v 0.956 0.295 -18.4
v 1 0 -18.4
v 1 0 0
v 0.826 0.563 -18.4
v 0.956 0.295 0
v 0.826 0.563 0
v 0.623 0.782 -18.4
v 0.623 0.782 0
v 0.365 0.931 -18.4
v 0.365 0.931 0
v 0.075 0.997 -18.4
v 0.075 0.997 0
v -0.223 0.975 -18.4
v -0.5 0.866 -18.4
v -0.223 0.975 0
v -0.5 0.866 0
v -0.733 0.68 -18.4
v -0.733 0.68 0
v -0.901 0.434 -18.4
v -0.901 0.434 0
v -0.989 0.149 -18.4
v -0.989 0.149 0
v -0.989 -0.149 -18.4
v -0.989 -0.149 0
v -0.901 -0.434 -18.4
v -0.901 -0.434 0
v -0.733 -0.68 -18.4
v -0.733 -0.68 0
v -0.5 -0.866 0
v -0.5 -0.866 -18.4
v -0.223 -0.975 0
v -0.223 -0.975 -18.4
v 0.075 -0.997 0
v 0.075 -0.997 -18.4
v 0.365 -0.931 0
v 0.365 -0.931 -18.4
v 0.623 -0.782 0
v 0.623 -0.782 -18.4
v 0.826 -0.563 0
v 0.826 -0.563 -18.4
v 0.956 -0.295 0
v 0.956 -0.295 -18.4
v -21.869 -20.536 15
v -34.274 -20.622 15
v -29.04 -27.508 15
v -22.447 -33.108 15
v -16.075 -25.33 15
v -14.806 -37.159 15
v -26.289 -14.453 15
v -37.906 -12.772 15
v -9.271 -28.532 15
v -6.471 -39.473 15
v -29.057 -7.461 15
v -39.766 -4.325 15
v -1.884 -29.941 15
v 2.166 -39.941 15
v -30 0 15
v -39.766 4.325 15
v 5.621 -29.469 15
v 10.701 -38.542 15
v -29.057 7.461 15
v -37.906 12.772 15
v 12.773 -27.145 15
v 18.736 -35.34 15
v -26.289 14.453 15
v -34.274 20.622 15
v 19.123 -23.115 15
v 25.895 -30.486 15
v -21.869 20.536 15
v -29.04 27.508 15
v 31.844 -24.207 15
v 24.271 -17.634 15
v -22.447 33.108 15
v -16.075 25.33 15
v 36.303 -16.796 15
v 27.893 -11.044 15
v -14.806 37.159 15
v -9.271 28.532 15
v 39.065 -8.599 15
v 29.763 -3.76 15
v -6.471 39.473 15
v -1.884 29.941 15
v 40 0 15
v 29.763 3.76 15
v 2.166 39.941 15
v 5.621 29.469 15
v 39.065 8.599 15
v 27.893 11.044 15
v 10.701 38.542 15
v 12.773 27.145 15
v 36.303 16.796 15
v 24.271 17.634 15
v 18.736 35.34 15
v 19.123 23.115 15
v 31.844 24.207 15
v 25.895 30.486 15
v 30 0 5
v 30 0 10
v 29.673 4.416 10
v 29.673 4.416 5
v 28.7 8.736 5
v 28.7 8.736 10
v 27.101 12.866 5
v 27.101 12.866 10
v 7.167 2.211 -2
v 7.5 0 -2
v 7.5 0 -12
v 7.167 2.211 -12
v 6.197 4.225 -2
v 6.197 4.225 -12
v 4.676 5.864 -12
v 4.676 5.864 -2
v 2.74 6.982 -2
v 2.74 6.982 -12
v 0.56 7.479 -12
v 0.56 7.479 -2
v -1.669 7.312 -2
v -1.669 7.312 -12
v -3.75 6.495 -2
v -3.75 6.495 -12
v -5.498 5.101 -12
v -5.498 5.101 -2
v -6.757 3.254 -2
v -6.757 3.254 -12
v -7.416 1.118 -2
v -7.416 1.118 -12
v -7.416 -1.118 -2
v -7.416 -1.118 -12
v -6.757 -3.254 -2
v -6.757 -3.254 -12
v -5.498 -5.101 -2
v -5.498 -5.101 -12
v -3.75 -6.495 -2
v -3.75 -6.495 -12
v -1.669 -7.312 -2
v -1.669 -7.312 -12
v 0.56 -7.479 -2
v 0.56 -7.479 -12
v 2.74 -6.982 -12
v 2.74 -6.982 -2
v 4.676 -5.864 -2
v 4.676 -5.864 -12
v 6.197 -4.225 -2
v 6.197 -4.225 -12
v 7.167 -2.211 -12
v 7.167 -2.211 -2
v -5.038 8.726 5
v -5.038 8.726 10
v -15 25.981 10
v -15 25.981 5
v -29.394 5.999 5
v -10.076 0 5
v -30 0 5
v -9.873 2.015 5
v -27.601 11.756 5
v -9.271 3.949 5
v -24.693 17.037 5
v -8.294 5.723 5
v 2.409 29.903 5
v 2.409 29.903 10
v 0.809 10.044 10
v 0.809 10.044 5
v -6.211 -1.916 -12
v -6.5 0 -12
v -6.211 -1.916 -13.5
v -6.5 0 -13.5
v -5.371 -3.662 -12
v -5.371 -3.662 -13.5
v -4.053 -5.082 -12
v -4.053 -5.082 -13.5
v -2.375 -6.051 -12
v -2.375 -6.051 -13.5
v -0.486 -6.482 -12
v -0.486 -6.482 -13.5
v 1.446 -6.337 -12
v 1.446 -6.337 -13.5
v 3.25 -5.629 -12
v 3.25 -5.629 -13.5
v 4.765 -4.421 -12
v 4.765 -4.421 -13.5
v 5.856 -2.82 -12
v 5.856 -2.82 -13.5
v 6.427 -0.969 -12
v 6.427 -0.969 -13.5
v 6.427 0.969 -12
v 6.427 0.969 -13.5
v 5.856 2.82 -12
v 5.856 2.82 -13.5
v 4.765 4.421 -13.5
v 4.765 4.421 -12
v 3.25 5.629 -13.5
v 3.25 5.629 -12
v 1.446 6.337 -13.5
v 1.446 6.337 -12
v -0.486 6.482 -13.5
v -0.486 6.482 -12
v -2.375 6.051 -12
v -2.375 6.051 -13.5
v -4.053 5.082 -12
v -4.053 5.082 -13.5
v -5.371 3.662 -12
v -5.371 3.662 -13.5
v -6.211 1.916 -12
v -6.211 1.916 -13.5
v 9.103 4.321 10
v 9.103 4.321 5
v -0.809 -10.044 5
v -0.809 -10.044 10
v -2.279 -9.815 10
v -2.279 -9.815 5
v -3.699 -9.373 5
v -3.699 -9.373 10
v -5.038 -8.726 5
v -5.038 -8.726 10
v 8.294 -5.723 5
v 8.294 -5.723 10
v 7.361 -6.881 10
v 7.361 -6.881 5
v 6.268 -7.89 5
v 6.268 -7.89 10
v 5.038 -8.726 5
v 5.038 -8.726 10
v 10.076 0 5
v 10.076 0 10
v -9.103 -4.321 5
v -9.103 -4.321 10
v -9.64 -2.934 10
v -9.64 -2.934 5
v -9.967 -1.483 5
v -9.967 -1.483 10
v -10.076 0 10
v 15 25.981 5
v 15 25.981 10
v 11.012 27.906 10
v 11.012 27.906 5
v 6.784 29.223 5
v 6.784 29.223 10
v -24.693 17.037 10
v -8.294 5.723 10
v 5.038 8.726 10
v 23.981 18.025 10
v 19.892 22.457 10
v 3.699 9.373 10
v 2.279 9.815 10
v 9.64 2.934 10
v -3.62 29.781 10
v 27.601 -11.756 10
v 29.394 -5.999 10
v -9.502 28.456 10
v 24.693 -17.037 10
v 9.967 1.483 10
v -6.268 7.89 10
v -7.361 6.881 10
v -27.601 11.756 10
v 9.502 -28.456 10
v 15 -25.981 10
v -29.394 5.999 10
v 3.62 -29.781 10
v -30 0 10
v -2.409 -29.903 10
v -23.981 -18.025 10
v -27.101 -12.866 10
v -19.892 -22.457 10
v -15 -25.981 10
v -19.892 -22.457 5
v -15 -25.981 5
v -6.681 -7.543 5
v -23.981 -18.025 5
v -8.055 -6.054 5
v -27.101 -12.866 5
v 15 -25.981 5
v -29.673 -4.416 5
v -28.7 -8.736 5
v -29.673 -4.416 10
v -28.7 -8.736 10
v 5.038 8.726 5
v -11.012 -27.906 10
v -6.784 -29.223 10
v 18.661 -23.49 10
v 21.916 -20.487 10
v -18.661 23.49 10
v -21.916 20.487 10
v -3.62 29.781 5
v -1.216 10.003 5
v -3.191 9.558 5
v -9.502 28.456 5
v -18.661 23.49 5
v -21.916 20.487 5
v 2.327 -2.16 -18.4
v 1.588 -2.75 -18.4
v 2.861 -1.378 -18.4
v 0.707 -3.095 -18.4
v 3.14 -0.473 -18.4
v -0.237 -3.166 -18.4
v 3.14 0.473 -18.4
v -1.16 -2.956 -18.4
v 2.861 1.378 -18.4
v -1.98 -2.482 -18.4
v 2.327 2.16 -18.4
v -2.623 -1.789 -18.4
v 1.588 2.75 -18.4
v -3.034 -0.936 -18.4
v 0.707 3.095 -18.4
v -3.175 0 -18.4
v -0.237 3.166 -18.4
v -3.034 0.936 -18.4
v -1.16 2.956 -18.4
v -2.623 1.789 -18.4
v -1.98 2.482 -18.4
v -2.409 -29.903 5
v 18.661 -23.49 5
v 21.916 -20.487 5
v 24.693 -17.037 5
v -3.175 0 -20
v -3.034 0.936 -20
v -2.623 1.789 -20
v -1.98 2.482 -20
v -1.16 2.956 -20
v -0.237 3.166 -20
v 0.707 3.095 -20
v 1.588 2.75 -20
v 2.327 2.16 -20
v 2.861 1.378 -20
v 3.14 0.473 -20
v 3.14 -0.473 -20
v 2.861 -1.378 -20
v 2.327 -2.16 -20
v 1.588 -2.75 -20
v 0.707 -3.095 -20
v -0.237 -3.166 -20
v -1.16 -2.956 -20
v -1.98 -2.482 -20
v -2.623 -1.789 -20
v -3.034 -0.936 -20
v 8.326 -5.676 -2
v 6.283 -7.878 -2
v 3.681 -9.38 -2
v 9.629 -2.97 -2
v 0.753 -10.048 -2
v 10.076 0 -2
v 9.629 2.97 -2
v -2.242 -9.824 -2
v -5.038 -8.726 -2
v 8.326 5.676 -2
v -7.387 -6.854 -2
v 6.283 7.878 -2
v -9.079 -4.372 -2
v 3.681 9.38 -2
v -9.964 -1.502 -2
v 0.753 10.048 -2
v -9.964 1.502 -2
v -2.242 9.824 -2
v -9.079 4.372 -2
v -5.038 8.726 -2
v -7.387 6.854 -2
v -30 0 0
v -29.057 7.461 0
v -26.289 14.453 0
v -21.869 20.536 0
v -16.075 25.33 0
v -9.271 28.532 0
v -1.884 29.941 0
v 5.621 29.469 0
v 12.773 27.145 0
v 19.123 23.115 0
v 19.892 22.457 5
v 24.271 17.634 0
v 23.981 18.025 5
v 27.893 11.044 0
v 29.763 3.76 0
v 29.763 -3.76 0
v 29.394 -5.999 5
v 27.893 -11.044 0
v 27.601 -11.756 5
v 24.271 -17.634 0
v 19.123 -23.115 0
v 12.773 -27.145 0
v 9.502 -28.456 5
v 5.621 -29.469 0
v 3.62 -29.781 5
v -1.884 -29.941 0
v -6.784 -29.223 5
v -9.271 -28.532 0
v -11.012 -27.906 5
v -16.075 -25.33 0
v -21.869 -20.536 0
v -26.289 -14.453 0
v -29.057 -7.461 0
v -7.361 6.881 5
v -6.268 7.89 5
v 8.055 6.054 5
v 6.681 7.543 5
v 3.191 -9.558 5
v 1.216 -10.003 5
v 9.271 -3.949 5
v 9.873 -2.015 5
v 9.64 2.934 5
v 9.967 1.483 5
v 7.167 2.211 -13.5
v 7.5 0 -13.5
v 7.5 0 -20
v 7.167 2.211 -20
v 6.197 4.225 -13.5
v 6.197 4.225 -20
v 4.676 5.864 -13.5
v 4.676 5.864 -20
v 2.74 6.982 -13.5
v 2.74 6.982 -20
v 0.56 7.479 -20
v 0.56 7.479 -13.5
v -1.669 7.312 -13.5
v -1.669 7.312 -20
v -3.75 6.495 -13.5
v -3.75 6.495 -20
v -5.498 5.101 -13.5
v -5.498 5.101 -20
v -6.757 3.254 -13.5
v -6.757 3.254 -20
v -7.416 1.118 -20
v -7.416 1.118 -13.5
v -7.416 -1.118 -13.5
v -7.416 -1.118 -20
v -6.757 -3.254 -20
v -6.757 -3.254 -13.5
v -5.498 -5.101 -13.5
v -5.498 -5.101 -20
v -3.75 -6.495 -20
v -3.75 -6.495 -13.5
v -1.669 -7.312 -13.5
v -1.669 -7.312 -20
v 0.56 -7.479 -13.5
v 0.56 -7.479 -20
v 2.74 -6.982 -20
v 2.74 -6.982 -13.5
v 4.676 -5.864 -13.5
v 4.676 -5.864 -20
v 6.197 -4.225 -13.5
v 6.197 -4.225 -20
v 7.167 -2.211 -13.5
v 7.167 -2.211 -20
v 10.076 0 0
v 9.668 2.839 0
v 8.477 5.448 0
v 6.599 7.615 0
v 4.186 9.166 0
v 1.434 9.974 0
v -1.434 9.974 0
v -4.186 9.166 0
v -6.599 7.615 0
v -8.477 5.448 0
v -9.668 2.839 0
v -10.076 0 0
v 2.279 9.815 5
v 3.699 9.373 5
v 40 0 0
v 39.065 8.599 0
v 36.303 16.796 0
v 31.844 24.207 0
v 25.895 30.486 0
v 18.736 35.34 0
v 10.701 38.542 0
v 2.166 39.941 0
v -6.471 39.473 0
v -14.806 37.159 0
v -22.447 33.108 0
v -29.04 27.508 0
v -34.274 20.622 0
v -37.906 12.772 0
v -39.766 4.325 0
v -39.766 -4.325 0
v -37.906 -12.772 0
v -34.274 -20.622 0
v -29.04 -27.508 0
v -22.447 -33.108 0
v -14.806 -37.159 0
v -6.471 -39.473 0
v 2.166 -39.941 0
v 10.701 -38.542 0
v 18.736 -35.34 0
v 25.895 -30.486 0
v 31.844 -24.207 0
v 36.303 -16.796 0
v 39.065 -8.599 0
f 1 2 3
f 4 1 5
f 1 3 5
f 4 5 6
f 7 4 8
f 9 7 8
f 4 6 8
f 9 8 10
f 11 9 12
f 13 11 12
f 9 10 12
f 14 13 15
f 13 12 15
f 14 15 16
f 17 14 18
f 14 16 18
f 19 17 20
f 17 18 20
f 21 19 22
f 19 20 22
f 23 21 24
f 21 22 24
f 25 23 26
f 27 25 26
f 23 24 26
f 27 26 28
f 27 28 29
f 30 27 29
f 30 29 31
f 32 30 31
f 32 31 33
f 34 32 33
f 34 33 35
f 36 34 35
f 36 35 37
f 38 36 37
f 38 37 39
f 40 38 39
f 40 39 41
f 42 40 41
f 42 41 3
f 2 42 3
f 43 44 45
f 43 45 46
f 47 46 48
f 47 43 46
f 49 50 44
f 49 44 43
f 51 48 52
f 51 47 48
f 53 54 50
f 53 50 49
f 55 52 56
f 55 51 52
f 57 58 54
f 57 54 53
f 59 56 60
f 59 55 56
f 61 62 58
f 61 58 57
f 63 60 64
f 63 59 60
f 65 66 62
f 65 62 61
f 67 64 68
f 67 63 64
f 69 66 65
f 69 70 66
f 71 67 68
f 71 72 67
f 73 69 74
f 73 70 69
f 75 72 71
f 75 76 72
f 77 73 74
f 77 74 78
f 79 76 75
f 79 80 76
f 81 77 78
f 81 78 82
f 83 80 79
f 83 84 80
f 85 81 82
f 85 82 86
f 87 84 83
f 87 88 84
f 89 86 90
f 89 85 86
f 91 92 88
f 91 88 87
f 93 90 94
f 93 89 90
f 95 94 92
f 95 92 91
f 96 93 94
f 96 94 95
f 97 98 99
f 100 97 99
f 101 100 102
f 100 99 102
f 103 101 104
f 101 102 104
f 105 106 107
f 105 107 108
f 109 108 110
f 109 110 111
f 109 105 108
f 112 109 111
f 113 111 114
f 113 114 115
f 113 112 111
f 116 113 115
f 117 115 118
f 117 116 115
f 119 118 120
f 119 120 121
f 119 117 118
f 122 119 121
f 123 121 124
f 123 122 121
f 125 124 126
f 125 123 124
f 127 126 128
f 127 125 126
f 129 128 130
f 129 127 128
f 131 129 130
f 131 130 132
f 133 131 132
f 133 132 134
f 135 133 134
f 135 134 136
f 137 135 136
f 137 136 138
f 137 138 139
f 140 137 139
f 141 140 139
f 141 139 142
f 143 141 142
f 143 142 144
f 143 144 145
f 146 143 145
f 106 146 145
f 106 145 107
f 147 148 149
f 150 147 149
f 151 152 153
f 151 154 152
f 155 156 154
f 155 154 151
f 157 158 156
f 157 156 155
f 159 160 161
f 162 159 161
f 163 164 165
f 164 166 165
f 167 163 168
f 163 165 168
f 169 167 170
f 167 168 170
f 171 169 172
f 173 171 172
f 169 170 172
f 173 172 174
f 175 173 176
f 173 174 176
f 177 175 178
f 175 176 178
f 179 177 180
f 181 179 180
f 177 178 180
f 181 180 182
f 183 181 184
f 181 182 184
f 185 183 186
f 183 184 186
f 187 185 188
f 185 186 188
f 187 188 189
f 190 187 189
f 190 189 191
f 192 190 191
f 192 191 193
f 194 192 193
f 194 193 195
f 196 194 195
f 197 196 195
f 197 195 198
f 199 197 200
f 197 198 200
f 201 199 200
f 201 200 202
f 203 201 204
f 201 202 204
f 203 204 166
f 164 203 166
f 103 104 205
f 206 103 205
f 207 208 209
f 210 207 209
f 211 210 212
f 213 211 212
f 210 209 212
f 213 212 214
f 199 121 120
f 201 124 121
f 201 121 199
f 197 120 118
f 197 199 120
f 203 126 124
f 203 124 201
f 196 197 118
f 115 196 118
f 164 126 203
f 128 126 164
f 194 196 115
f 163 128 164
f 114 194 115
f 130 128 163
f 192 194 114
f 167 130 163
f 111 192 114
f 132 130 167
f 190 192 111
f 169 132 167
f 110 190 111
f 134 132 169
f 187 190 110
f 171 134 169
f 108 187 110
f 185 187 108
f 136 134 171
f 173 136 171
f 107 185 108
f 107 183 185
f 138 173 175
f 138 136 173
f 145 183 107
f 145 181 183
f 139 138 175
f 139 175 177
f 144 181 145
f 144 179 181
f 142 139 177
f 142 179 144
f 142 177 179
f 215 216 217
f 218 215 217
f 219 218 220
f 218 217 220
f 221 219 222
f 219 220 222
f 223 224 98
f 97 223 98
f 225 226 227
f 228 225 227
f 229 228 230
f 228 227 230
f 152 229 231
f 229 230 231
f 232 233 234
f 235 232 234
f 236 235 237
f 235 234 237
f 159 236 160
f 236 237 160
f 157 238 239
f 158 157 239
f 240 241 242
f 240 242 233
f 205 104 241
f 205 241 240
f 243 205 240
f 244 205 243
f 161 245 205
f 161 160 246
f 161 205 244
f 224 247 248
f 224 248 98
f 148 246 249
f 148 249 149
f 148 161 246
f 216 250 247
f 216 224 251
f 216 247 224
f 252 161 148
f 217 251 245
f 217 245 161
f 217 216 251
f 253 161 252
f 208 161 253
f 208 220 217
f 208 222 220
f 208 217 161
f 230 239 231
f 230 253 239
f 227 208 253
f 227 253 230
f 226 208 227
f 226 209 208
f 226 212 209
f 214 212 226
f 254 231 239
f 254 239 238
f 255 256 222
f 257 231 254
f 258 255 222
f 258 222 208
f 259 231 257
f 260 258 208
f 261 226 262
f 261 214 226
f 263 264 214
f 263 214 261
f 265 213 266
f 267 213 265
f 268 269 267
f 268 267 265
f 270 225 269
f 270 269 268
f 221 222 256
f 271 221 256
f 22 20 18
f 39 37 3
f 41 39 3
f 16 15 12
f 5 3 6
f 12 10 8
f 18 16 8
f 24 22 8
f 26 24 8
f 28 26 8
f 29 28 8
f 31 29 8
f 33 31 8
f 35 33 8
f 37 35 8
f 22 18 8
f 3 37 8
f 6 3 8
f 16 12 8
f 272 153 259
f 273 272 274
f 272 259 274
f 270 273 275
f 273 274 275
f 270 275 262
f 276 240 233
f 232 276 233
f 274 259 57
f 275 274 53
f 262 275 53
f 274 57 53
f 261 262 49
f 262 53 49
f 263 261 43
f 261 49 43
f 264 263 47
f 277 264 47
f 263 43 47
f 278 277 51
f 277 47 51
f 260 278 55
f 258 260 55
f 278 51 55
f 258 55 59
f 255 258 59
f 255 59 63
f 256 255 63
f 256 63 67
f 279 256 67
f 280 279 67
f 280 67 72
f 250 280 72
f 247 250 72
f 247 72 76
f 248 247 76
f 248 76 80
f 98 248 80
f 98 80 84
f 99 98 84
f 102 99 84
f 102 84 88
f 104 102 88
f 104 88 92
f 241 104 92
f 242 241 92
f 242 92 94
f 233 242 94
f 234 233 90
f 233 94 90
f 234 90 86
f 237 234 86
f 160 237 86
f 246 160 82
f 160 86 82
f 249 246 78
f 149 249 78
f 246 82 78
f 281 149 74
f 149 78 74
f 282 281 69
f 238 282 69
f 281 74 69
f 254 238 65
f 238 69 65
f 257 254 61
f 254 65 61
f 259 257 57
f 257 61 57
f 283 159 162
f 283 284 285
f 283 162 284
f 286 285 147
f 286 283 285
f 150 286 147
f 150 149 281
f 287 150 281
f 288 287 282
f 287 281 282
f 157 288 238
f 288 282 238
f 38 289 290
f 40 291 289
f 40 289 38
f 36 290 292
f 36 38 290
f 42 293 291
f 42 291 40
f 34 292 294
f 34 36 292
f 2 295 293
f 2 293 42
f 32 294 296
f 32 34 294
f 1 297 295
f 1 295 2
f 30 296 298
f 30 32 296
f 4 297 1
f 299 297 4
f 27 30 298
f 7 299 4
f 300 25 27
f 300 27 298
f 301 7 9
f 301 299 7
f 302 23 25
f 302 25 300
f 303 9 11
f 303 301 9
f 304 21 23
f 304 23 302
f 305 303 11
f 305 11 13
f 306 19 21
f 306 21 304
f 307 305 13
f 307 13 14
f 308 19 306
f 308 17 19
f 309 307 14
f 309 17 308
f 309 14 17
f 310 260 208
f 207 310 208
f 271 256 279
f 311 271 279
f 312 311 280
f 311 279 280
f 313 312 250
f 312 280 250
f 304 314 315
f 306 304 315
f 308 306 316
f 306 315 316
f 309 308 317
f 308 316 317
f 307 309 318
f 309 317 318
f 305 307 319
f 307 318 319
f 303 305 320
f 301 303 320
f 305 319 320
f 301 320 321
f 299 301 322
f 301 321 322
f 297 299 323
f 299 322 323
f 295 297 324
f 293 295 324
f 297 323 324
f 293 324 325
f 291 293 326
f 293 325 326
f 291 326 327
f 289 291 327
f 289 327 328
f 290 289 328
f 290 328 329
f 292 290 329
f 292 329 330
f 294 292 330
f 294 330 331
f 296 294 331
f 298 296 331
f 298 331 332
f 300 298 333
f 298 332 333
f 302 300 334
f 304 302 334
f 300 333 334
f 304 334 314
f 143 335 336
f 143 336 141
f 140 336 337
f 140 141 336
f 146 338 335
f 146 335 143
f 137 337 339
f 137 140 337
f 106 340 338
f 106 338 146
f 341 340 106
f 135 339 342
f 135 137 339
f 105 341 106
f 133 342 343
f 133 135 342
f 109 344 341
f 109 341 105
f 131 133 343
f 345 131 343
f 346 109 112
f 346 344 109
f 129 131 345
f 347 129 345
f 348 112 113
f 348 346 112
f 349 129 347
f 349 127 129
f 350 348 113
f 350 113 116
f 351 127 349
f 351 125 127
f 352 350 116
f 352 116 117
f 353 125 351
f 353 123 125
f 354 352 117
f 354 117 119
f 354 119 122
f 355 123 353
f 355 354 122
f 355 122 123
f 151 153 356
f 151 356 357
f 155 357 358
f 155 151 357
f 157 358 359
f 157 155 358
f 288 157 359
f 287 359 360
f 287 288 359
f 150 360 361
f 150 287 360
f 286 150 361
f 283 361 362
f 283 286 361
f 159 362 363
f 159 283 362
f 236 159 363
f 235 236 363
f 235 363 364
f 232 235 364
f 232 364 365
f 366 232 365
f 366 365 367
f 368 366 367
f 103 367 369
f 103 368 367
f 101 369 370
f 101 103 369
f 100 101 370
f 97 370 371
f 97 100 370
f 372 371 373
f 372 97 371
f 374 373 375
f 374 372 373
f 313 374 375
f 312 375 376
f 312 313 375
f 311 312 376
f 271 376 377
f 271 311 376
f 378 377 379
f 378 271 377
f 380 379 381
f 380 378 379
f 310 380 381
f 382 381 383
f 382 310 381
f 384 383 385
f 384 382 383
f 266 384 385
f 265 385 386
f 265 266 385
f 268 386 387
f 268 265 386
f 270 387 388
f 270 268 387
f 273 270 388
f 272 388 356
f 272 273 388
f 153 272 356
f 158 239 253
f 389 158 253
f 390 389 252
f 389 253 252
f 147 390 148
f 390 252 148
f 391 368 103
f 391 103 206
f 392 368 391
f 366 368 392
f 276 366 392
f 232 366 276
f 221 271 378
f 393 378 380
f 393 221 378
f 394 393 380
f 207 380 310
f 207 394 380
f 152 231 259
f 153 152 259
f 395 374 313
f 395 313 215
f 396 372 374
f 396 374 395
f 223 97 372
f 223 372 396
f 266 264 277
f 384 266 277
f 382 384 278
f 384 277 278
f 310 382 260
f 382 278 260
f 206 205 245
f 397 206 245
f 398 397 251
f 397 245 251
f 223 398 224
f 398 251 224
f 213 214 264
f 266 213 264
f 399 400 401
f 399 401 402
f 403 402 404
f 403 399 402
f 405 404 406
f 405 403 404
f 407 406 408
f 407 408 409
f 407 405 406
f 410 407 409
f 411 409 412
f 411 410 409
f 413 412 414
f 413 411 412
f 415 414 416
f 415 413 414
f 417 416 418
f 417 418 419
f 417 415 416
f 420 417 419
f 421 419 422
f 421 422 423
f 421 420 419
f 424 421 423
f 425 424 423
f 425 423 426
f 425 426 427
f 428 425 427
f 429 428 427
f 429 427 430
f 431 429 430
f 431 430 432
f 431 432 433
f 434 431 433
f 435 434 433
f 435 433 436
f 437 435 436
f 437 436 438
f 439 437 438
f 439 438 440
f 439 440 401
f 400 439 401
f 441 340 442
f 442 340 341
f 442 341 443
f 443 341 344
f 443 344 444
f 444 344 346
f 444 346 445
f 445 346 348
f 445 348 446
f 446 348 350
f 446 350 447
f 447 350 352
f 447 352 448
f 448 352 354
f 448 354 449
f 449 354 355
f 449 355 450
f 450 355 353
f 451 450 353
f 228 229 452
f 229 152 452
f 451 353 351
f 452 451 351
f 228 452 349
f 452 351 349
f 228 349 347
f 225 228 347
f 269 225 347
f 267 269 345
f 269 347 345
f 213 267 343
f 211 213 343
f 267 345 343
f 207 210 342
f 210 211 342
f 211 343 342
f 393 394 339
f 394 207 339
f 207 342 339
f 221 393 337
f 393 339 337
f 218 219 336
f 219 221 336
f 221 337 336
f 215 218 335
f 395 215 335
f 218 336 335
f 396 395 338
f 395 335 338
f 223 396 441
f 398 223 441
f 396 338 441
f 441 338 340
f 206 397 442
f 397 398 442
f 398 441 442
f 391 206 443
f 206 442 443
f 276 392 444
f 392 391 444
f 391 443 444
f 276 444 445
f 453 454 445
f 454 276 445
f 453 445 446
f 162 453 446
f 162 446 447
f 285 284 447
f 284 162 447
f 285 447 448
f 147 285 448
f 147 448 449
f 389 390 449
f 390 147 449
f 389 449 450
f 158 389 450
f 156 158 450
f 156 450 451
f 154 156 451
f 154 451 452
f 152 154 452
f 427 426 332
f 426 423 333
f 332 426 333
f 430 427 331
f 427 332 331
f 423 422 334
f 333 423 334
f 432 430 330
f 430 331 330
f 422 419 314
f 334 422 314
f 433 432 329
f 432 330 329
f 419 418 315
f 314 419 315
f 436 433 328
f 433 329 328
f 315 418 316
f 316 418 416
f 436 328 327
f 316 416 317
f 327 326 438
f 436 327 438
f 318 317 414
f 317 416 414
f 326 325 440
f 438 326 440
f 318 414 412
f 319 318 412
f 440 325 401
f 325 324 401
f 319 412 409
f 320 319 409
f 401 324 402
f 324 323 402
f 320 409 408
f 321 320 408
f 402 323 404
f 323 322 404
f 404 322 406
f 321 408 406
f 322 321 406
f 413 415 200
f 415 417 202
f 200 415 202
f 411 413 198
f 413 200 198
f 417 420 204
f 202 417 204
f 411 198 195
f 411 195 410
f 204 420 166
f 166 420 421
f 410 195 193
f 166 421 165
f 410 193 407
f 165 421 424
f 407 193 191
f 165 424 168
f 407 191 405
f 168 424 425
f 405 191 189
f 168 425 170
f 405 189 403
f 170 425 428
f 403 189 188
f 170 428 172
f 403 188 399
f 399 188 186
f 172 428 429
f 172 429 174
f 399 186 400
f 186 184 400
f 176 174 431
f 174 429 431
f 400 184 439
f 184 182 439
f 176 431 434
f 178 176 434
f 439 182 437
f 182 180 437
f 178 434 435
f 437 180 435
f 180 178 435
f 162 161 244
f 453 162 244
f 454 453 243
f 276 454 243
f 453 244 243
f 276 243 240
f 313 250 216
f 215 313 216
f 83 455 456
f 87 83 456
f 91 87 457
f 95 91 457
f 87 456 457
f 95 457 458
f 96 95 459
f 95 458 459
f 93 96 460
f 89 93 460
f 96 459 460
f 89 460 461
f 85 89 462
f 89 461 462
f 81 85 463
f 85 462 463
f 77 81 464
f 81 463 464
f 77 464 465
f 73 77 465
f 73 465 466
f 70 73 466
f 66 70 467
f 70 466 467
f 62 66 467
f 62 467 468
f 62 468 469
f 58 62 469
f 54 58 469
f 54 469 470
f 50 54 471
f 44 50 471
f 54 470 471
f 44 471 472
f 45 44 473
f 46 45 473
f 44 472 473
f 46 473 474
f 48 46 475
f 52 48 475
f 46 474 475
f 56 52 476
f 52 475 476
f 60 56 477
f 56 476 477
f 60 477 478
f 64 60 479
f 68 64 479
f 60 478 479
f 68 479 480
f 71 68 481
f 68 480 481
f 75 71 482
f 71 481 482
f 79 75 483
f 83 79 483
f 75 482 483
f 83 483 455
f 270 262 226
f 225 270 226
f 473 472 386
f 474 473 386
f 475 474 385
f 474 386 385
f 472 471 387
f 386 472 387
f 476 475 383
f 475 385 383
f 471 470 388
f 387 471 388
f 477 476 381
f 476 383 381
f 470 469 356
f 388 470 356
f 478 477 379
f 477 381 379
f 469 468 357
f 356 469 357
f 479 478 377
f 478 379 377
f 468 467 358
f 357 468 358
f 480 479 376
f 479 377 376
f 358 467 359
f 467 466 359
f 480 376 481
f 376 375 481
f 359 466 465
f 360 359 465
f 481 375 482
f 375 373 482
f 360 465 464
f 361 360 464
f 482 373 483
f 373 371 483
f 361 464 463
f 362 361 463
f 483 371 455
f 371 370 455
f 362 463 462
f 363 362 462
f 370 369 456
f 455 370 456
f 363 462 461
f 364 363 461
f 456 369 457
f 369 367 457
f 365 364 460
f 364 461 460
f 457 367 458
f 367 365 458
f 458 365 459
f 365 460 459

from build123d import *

# Parameters (mm, degrees)
SKETCH1_R           = 40
BOSS_EXTRUDE1_DEPTH = 15
SKETCH2_R           = 7.5
SKETCH2_R_2         = 1
BOSS_EXTRUDE2_DEPTH = 20
SKETCH4_R           = 3.175
CUT_EXTRUDE1_DEPTH  = 1.6
SKETCH5_W           = 2
SKETCH5_H           = 2.576429586
SKETCH5_W_2         = 1.5
SKETCH5_H_2         = 1
SKETCH5_4_W         = 1.5
SKETCH5_4_H         = 1
CUT_EXTRUDE2_START  = -5
SKETCH6_R           = 30
SKETCH6_R_2         = 10.076429586
CUT_EXTRUDE2_DEPTH  = 5
SKETCH7_R           = 30
CUT_EXTRUDE3_DEPTH  = 5
CUT_EXTRUDE4_START  = -5
CUT_EXTRUDE4_DEPTH  = 5


with BuildPart() as part:
    # Sketch1 → Boss-Extrude1 (new body)
    with BuildSketch(Plane.XY):
        Circle(SKETCH1_R)
    extrude(amount=BOSS_EXTRUDE1_DEPTH)

    # Sketch2 → Boss-Extrude2 (add)
    with BuildSketch(Plane.XY):
        Circle(SKETCH2_R)
        Circle(SKETCH2_R_2, mode=Mode.SUBTRACT)
    extrude(amount=-BOSS_EXTRUDE2_DEPTH)

    # Sketch4 → Cut-Extrude1 (cut)
    with BuildSketch(Plane(origin=(0, 0, -20), x_dir=(-1, 0, 0), z_dir=(0, 0, -1))):
        Circle(SKETCH4_R)
    extrude(amount=-CUT_EXTRUDE1_DEPTH, mode=Mode.SUBTRACT)

    # Sketch5 → Revolve2 (revolve)
    with BuildSketch(Plane(origin=(0, 0, 0), x_dir=(0, 0, -1), z_dir=(1, 0, 0))):
        with Locations((1, 8.788214793)):
            Rectangle(SKETCH5_W, SKETCH5_H)
        with Locations((12.75, 7)):
            Rectangle(SKETCH5_W_2, SKETCH5_H_2)
    revolve(axis=Axis((0, 0, -21.75), (0, 0, 1)))

    # Sketch5<4> → Cut-Revolve1 (revolve, cut)
    with BuildSketch(Plane(origin=(0, 0, 0), x_dir=(0, 0, -1), z_dir=(1, 0, 0))):
        with Locations((12.75, 7)):
            Rectangle(SKETCH5_4_W, SKETCH5_4_H)
    revolve(axis=Axis((0, 0, -21.75), (0, 0, 1)), mode=Mode.SUBTRACT)

    # Sketch6 → Cut-Extrude2 (cut)
    with BuildSketch(Plane(origin=(0, 0, 0), x_dir=(-1, 0, 0), z_dir=(0, 0, -1)).offset(CUT_EXTRUDE2_START)):
        Circle(SKETCH6_R)
        Circle(SKETCH6_R_2, mode=Mode.SUBTRACT)
    extrude(amount=CUT_EXTRUDE2_DEPTH, mode=Mode.SUBTRACT)

    # Sketch7 → Cut-Extrude3 (cut)
    with BuildSketch(Plane.XY.offset(15)):
        Circle(SKETCH7_R)
    extrude(amount=-CUT_EXTRUDE3_DEPTH, mode=Mode.SUBTRACT)

    # Sketch8 → Cut-Extrude4 (cut)
    with BuildSketch(Plane(origin=(0, 0, 5), x_dir=(-1, 0, 0), z_dir=(0, 0, -1)).offset(CUT_EXTRUDE4_START)):
        with BuildLine():
            Line((-10.076429586, 0), (-30, 0))
            ThreePointArc((-30, 0), (-29.266323118, 6.59411337), (-27.101177924, 12.865696838))
            Line((-27.101177924, 12.865696838), (-9.102770368, 4.321342942))
            ThreePointArc((-9.102770368, 4.321342942), (-9.830001471, 2.214837302), (-10.076429586, 0))
        make_face()
        with BuildLine():
            Line((-2.408568663, 29.903156974), (-0.808992418, 10.043901854))
            ThreePointArc((-0.808992418, 10.043901854), (-2.996895367, 9.620449644), (-5.038214793, 8.726444001))
            Line((-5.038214793, 8.726444001), (-15, 25.980762114))
            ThreePointArc((-15, 25.980762114), (-8.922491865, 28.642435981), (-2.408568663, 29.903156974))
        make_face()
        with BuildLine():
            Line((24.692609261, 17.037460136), (8.29377795, 5.722558913))
            ThreePointArc((8.29377795, 5.722558913), (6.833106104, 7.405612342), (5.038214793, 8.726444001))
            Line((5.038214793, 8.726444001), (15, 25.980762114))
            ThreePointArc((15, 25.980762114), (20.343831253, 22.048322611), (24.692609261, 17.037460136))
        make_face()
        with BuildLine():
            Line((27.101177924, -12.865696838), (9.102770368, -4.321342942))
            ThreePointArc((9.102770368, -4.321342942), (9.830001471, -2.214837302), (10.076429586, 0))
            Line((10.076429586, 0), (30, 0))
            ThreePointArc((30, 0), (29.266323118, -6.59411337), (27.101177924, -12.865696838))
        make_face()
        with BuildLine():
            Line((2.408568663, -29.903156974), (0.808992418, -10.043901854))
            ThreePointArc((0.808992418, -10.043901854), (2.996895367, -9.620449644), (5.038214793, -8.726444001))
            Line((5.038214793, -8.726444001), (15, -25.980762114))
            ThreePointArc((15, -25.980762114), (8.922491865, -28.642435981), (2.408568663, -29.903156974))
        make_face()
        with BuildLine():
            Line((-24.692609261, -17.037460136), (-8.29377795, -5.722558913))
            ThreePointArc((-8.29377795, -5.722558913), (-6.833106104, -7.405612342), (-5.038214793, -8.726444001))
            Line((-5.038214793, -8.726444001), (-15, -25.980762114))
            ThreePointArc((-15, -25.980762114), (-20.343831253, -22.048322611), (-24.692609261, -17.037460136))
        make_face()
    extrude(amount=CUT_EXTRUDE4_DEPTH, mode=Mode.SUBTRACT)


solid = part.part
